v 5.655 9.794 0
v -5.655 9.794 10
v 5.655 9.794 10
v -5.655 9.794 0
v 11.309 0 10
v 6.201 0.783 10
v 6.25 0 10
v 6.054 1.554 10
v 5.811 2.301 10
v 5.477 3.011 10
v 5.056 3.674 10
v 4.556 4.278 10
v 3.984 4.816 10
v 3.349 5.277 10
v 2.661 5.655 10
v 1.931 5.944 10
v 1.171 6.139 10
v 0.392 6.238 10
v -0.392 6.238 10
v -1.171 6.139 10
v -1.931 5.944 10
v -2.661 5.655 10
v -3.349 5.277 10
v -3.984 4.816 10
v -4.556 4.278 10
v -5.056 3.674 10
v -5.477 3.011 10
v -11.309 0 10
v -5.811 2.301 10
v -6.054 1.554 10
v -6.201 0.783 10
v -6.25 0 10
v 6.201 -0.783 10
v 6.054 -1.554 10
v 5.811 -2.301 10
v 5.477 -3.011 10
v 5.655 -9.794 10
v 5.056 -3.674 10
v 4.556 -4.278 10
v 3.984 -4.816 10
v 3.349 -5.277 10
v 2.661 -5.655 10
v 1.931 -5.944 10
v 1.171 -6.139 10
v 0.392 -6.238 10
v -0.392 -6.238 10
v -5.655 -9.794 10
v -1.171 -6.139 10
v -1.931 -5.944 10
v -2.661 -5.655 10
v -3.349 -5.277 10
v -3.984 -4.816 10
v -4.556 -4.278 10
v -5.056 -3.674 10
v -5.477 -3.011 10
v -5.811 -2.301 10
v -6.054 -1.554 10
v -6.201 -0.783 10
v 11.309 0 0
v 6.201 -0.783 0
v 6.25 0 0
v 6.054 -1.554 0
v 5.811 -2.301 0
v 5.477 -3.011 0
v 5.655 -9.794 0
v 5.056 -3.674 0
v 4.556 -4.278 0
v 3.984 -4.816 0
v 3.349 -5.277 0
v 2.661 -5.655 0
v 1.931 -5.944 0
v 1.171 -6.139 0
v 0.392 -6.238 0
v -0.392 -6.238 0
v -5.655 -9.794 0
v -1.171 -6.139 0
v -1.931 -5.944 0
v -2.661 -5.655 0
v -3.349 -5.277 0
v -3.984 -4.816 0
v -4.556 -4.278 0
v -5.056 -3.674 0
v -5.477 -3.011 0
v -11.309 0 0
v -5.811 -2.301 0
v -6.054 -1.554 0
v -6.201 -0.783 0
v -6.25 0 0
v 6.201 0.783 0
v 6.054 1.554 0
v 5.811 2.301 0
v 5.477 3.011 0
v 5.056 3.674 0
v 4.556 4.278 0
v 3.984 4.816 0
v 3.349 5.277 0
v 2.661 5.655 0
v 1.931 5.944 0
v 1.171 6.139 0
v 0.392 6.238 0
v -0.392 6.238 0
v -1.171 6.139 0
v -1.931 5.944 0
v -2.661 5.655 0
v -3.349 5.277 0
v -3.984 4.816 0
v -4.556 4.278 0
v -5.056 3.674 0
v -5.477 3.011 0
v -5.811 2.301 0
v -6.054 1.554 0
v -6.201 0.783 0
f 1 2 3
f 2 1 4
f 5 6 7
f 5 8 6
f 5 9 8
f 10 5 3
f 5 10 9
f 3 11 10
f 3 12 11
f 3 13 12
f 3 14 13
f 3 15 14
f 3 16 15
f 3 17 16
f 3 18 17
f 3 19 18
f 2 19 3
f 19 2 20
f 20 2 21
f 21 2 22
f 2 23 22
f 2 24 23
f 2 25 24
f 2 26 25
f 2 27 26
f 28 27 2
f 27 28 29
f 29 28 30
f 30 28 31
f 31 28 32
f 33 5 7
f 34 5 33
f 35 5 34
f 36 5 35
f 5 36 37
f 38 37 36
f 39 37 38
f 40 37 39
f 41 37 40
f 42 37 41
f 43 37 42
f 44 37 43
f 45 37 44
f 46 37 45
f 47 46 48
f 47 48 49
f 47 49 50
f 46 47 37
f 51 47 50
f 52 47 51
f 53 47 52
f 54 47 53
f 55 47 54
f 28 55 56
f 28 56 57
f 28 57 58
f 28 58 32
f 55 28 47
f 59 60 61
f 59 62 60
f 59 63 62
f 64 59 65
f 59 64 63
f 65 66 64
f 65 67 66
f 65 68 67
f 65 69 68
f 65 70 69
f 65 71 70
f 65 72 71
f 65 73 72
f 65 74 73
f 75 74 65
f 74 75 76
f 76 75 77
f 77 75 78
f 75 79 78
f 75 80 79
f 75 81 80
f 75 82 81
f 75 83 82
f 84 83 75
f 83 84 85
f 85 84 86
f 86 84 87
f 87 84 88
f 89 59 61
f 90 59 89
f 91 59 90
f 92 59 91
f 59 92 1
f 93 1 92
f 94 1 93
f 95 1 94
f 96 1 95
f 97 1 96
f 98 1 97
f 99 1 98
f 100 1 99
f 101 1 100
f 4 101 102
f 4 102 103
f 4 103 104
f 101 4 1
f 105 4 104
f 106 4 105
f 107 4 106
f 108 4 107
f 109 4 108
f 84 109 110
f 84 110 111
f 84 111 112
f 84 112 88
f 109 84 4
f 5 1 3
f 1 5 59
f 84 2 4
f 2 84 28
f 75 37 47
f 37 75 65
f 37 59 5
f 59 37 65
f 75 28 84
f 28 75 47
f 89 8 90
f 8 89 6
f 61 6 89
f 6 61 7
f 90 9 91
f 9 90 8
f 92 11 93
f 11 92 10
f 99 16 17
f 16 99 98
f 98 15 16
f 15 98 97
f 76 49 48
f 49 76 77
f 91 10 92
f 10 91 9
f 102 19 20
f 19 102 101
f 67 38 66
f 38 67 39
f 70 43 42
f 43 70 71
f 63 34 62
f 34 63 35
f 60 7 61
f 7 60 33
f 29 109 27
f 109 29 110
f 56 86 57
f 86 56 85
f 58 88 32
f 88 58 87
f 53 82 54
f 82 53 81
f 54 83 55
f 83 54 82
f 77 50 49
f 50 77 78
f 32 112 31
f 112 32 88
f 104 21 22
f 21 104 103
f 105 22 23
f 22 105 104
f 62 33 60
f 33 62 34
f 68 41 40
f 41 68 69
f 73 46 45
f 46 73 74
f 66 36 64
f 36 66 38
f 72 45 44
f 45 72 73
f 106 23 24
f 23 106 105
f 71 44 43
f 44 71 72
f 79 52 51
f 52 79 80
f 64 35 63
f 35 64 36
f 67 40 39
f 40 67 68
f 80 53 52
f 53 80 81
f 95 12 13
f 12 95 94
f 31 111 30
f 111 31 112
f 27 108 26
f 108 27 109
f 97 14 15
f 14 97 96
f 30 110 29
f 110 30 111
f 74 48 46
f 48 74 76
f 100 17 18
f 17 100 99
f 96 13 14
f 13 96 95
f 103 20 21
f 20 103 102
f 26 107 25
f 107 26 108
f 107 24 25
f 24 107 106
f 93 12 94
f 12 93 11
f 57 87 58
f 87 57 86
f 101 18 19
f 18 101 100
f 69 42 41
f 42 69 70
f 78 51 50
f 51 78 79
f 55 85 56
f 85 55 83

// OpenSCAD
$fn = 50;


difference() {
	union() {
		translate(v = [0, 0, 0]) {
			rotate(a = [0, 0, 0]) {
				difference() {
					union() {
						linear_extrude(height = 10) {
							polygon(points = [[11.3092000000, 0.0000000000], [5.6546000000, 9.7940544965], [-5.6546000000, 9.7940544965], [-11.3092000000, 0.0000000000], [-5.6546000000, -9.7940544965], [5.6546000000, -9.7940544965]]);
						}
					}
					union();
				}
			}
		}
	}
	union() {
		cylinder(h = 100, r = 6.2500000000);
	}
}
